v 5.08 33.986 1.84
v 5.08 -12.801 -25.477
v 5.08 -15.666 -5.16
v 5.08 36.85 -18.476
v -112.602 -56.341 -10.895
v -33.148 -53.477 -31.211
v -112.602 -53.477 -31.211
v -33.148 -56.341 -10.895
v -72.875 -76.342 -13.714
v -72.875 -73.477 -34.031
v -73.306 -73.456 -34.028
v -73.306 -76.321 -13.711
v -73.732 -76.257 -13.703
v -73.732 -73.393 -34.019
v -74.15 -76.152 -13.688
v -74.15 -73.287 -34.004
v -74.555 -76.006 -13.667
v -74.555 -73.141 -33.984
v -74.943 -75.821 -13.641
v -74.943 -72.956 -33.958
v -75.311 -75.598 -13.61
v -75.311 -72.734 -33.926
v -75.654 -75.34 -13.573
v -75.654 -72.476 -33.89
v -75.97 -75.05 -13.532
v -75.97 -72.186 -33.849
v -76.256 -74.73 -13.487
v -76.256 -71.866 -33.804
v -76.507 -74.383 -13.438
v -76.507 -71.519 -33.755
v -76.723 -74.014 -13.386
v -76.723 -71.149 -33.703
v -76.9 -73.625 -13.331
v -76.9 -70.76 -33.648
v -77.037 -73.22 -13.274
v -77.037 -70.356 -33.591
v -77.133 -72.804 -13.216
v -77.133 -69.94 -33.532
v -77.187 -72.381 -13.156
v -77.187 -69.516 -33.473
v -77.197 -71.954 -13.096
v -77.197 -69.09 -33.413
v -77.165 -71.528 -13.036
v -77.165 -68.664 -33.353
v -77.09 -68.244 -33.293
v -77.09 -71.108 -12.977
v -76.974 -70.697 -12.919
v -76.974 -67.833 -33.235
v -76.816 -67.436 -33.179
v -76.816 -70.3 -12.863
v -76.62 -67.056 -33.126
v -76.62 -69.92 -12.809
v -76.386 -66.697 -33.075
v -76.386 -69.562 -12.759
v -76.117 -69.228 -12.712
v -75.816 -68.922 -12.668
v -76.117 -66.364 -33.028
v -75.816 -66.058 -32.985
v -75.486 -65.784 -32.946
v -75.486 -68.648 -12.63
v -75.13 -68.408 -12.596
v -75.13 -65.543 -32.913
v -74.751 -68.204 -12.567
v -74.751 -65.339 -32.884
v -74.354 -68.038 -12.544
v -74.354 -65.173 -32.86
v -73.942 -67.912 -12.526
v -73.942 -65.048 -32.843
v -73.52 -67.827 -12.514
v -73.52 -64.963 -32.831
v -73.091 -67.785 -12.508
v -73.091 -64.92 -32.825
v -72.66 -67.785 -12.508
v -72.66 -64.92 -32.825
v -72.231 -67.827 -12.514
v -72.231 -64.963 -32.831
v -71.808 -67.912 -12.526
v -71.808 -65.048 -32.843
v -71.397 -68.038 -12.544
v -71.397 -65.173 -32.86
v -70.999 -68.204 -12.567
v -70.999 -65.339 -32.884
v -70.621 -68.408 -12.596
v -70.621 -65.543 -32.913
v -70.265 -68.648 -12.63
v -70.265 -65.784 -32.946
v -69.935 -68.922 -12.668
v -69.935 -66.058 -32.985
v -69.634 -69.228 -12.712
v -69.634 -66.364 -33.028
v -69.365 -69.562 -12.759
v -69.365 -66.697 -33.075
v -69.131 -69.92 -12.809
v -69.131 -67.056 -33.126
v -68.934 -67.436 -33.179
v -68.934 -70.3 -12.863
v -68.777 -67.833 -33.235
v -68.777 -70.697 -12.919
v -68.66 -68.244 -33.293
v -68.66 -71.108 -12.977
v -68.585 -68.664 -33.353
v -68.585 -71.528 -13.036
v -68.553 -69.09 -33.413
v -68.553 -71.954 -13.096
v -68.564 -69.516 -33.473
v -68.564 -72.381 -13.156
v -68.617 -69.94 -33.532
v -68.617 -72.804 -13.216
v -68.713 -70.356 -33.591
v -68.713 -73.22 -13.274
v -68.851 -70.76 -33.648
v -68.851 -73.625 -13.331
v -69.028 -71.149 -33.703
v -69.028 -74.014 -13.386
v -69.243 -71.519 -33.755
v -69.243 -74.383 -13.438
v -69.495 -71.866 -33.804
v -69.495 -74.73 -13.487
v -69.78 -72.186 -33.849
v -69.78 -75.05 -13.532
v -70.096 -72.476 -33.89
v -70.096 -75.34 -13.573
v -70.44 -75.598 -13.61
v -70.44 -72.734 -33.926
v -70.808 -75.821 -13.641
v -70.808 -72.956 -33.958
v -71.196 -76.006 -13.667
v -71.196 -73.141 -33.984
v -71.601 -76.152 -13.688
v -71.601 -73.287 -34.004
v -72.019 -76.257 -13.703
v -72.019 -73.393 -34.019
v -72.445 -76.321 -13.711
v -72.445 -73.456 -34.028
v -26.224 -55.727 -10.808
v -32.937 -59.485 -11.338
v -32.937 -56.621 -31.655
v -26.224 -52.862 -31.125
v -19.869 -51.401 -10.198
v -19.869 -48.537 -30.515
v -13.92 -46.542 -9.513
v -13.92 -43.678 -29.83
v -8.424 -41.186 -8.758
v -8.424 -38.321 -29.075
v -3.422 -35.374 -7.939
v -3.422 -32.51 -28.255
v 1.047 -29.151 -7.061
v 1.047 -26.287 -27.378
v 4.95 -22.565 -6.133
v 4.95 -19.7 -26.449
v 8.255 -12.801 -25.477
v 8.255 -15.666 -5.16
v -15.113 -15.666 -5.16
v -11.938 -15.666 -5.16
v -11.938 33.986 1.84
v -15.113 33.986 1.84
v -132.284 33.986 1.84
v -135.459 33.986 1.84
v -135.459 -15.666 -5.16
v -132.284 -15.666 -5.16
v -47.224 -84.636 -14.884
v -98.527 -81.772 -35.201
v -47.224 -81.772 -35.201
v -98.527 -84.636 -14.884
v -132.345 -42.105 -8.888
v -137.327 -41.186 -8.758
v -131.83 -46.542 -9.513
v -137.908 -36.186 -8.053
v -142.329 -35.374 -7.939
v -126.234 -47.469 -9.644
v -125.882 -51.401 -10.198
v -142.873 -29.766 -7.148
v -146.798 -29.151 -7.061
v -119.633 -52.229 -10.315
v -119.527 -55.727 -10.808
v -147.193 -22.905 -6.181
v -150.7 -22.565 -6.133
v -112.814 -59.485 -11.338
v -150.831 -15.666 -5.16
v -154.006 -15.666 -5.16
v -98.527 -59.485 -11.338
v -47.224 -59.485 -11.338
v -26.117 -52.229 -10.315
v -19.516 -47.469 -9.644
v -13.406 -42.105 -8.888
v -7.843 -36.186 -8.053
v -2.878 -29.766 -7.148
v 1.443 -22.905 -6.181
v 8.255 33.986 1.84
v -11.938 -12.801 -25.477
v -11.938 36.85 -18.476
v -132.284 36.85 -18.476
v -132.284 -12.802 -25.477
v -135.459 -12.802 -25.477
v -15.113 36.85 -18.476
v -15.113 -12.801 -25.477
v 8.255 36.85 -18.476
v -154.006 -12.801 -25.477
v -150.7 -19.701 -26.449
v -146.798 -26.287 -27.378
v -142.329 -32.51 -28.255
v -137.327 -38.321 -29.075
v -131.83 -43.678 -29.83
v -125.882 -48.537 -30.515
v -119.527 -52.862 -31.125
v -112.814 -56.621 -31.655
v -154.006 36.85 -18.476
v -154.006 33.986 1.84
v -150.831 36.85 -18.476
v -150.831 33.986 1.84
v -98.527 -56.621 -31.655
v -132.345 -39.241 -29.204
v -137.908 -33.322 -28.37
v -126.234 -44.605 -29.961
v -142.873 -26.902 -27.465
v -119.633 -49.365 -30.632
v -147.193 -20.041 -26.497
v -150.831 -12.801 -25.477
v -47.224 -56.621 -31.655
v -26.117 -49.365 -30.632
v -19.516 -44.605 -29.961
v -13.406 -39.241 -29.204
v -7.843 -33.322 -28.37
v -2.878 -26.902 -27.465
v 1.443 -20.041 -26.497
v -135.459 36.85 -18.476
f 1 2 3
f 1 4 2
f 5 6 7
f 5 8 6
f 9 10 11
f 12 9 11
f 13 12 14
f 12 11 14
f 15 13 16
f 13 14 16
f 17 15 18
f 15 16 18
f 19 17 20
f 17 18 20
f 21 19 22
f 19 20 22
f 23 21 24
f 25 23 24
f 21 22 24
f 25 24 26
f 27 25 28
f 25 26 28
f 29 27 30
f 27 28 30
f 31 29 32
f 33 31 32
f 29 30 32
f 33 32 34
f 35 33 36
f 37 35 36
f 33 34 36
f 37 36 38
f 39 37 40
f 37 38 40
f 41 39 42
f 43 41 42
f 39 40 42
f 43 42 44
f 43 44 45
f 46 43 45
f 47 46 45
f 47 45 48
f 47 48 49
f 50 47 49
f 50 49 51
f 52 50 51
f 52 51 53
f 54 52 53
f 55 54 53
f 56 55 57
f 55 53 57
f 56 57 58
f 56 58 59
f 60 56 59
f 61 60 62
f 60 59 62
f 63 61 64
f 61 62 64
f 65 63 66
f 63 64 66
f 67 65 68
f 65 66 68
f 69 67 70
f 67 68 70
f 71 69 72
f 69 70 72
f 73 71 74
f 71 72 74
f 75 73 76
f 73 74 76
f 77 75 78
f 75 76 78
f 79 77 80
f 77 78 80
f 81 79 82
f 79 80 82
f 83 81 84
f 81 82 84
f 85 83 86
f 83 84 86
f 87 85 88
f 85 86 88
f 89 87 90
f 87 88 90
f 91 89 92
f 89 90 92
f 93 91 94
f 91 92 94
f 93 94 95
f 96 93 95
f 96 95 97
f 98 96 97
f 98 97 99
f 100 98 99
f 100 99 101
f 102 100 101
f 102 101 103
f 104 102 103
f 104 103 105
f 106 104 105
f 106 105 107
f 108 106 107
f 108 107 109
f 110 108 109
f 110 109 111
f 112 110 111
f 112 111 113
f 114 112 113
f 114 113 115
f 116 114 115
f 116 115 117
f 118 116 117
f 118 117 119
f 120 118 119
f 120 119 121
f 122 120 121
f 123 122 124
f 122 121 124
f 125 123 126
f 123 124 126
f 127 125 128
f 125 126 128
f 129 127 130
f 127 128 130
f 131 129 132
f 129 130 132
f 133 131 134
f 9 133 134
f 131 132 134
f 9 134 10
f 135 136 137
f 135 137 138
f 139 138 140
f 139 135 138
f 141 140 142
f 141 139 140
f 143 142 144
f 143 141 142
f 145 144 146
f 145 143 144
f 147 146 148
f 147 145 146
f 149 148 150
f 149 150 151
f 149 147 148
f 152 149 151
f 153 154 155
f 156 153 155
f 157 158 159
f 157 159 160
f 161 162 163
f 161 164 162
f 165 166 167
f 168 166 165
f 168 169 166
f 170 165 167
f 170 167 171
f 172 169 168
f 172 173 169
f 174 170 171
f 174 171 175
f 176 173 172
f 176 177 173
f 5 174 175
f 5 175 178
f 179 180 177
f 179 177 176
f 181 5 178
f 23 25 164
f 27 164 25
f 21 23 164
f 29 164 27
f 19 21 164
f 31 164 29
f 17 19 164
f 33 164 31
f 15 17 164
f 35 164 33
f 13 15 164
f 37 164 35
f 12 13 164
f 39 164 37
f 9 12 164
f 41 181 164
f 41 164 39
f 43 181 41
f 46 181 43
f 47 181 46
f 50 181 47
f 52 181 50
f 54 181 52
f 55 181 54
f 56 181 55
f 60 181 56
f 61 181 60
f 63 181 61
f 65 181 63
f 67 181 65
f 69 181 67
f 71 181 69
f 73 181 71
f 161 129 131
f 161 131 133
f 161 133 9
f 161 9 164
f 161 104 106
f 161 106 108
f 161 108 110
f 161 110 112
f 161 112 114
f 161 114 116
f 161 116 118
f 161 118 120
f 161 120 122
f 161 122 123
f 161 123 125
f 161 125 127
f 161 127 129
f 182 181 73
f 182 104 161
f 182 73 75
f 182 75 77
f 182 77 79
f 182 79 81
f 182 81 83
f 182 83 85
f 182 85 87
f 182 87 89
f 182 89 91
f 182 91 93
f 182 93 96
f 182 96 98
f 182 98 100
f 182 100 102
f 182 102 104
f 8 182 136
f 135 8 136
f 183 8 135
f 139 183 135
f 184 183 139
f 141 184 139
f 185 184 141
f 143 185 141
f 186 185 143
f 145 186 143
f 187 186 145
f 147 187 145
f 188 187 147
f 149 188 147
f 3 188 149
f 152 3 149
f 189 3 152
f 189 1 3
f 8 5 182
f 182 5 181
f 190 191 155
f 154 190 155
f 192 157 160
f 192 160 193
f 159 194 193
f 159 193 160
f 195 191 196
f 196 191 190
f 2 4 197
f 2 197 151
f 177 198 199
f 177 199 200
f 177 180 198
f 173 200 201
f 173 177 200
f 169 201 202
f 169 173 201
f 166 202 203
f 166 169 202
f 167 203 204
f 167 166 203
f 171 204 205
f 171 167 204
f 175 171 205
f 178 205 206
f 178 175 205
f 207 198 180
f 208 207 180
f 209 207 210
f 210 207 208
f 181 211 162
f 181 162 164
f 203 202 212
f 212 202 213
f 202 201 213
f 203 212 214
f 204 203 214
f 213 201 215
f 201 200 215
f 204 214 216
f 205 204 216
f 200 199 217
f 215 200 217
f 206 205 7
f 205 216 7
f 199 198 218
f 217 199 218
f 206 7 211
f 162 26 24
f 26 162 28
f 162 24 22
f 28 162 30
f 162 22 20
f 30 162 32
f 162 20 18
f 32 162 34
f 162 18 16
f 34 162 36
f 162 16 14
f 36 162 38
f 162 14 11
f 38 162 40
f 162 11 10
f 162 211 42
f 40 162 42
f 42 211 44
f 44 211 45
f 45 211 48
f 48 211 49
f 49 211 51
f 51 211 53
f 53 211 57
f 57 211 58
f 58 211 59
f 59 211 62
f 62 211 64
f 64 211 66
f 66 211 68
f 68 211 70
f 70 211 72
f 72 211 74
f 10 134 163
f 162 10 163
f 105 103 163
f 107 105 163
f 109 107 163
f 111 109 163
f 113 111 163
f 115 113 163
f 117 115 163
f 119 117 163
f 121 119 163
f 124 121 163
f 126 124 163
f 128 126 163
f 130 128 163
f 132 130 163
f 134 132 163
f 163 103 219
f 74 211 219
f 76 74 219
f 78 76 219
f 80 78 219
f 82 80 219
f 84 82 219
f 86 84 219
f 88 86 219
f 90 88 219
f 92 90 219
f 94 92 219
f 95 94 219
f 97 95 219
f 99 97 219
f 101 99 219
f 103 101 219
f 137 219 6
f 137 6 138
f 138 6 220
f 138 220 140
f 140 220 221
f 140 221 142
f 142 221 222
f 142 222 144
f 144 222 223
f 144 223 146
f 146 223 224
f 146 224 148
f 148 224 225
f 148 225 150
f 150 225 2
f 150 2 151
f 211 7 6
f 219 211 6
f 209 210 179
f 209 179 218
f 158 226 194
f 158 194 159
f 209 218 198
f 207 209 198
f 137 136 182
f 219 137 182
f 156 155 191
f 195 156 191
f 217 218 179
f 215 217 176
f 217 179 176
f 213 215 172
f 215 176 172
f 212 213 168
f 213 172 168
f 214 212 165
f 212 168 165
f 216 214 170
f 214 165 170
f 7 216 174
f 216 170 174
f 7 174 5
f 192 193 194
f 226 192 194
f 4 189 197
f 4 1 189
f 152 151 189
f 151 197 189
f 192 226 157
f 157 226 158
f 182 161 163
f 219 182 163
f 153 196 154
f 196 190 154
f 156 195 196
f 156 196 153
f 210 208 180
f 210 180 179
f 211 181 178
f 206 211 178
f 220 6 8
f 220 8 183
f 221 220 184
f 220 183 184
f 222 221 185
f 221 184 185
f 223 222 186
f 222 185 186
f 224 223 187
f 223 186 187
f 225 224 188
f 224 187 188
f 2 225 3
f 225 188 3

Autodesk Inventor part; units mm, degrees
ref_plane "YZ Plane" through (0, 0, 0) normal (1, 0, 0) x (0, 1, 0)
ref_plane "XZ Plane" through (0, 0, 0) normal (0, 1, 0) x (-1, 0, 0)
ref_plane "XY Plane" through (0, 0, 0) normal (0, 0, 1) x (1, 0, 0)
sketch "Sketch1" plane through (0, 0, 0) normal (1, 0, 0) x (0, 1, 0)
  spline S0 degree 3 poles (-12.7596, 69.1102) (-15.2298, 61.5354) (-16.003, 54.7493) (-14.7341, 46.512) (-13.9585, 44.5403) (-12.6997, 40.1512) (-11.8689, 37.886) (-10.5675, 32.6221) (-10.0341, 29.5076) (-9.2498, 23.4956) (-9.1586, 20.4828) (-8.7362, 14.9457) (-8.298, 12.4468) (-8.4378, 7.0305) (-9.5013, 4.1287) (-9.4732, -0.7666) (-9.0812, -2.8089) (-8.7088, -6.0813) (-8.5625, -7.3217) (-8.4075, -8.5547) knots 0 0 0 0 0.241973 0.241973 0.332352 0.332352 0.424089 0.424089 0.541798 0.541798 0.658072 0.658072 0.76087 0.76087 0.872069 0.872069 0.951758 0.951758 1 1 1 1 construction
  spline S1 degree 3 poles (-8.4075, -8.5547) (-8.309, -9.3389) (-8.207, -10.12) (-7.7153, -13.7099) (-7.2118, -16.3393) (-6.3841, -22.1405) (-6.6665, -24.8142) (-5.6218, -28.3135) knots 0 0 0 0 0.119502 0.119502 0.553846 0.553846 1 1 1 1 construction
  spline S2 degree 3 poles (-5.6218, -28.3135) (-4.1228, -33.3346) (0.624, -41.8906) (3.9625, -48.268) (4.5736, -49.3774) (8.1498, -55.2575) (12.792, -61.9002) (17.7565, -68.8098) (19.0389, -70.9296) (26.2047, -78.6536) (35.4784, -85.2147) (49.0059, -92.3069) (55.6073, -92.3063) (68.5377, -94.6562) (74.996, -95.2419) (83.2666, -94.7145) (86.6124, -93.0362) (89.415, -93.015) (89.4684, -93.7995) (89.9841, -94.339) (90.2258, -94.7218) (89.67, -94.6644) (89.4356, -94.0936) (87.2104, -94.21) (84.8902, -94.7513) (80.0382, -96.05) (76.8909, -97.5474) (70.3825, -98.6246) (66.2945, -98.5443) (60.1257, -98.0168) (58.2481, -97.7121) (54.5132, -96.7744) (53.8418, -96.5978) (53.124, -96.4018) knots 0 0 0 0 0.060463 0.060463 0.088876 0.088876 0.149034 0.149034 0.189187 0.189187 0.280144 0.280144 0.381032 0.381032 0.501928 0.501928 0.587779 0.587779 0.653298 0.653298 0.710459 0.710459 0.757232 0.757232 0.814775 0.814775 0.872532 0.872532 0.939307 0.939307 0.990036 0.990036 1 1 1 1 construction
  spline S3 degree 3 poles (29.4725, -27.9505) (29.7232, -28.7604) (30.1347, -29.057) (32.5515, -32.3248) (34.3621, -34.4691) (37.878, -38.892) (37.7974, -39.3941) (41.586, -43.4308) (43.873, -45.7682) (49.5626, -50.6314) (51.8392, -50.9545) (60.2395, -53.9595) (66.6243, -55.2783) (76.7213, -57.0347) (82.4961, -56.8836) (87.4768, -57.2216) (87.6182, -57.0776) (89.8132, -57.4611) (91.5195, -57.7058) (92.188, -58.3474) (92.2546, -58.677) (90.5785, -59.545) (88.9174, -60.1439) (85.9397, -61.0379) (84.1283, -61.4382) (81.4338, -61.8751) (80.6089, -61.9837) (79.7567, -62.0753) knots 0 0 0 0 0.04737 0.04737 0.082065 0.082065 0.155524 0.155524 0.204555 0.204555 0.315622 0.315622 0.438816 0.438816 0.586443 0.586443 0.691275 0.691275 0.771281 0.771281 0.841079 0.841079 0.898194 0.898194 0.96846 0.96846 1 1 1 1 construction
  spline S4 degree 3 poles (28.8564, -23.7777) (28.9042, -24.5022) (28.9667, -25.1696) (29.2425, -26.8854) (29.3324, -27.498) (29.4725, -27.9505) knots 0 0 0 0 0.335914 0.335914 1 1 1 1 construction
  spline S5 degree 3 poles (27.5568, -11.1594) (27.8944, -13.1016) (28.2256, -15.1008) (28.7027, -19.1945) (28.7203, -21.7171) (28.8564, -23.7777) knots 0 0 0 0 0.46171 0.46171 1 1 1 1 construction
  spline S6 degree 3 poles (26.2925, -4.4074) (26.5211, -5.6352) (26.805, -6.8301) (27.1945, -9.1012) (27.3765, -10.1222) (27.5568, -11.1594) knots 0 0 0 0 0.568778 0.568778 1 1 1 1 construction
  spline S7 degree 3 poles (16.0432, 69.6268) (18.6865, 66.183) (20.6385, 61.0286) (22.3448, 51.7367) (22.7474, 48.7933) (23.2098, 43.6518) (23.1117, 41.1975) (23.483, 35.6031) (24.0275, 32.6396) (24.3977, 26.501) (24.1107, 23.3997) (24.6444, 17.6215) (25.4306, 14.8381) (25.926, 9.3729) (25.7134, 6.8435) (25.8358, 1.9262) (25.7789, -0.3383) (26.0611, -3.0685) (26.1687, -3.7428) (26.2925, -4.4074) knots 0 0 0 0 0.257427 0.257427 0.348427 0.348427 0.440796 0.440796 0.559313 0.559313 0.676387 0.676387 0.779892 0.779892 0.891856 0.891856 0.972092 0.972092 1 1 1 1 construction
  point P0 (0, 0)
ref_plane "Work Plane1" through (0, -5.6218, -28.3135) normal (-1, 0, 0) x (0, -0.1396054, 0.9902072)
ref_plane "Work Plane2" through (5.08, -5.6218, -28.3135) normal (-1, 0, 0) x (0, -0.1396054, 0.9902072)
sketch "Sketch2" plane through (5.08, -5.6218, -28.3135) normal (-1, 0, 0) x (0, -0.1396054, 0.9902072)
  line L0 (3.8114, -6.7133) -> (24.329, -6.7133)
  line L1 (24.329, -6.7133) -> (24.329, 43.4294)
  line L2 (24.329, 43.4294) -> (3.8114, 43.4294)
  line L3 (3.8114, 43.4294) -> (3.8114, -6.7133)
  point P0 (27.2514, 9.5195)
extrude "Extrusion1" add sketch "Sketch2" against normal blind 3.175
ref_plane "Work Plane3" through (-11.938, -5.6218, -28.3135) normal (-1, 0, 0) x (0, -0.1396054, 0.9902072)
sketch "Sketch3" plane through (-11.938, -5.6218, -28.3135) normal (-1, 0, 0) x (0, -0.1396054, 0.9902072)
  line L0 (24.329, -6.7133) -> (24.329, 43.4294) projected
  line L1 (24.329, 43.4294) -> (3.8114, 43.4294) projected
  line L2 (3.8114, 43.4294) -> (3.8114, -6.7133) projected
  line L3 (3.8114, -6.7133) -> (24.329, -6.7133) projected
  point P0 (27.2514, 9.5195)
extrude "Extrusion2" add sketch "Sketch3" along normal blind 3.175
sketch "Sketch4" plane through (5.08, -5.6218, -28.3135) normal (-1, 0, 0) x (0, -0.1396054, 0.9902072)
  point P0 (27.2514, 9.5195)
ref_plane "Work Plane4" through (6.6675, 33.9858, 1.8402) normal (0, 0.9902072, 0.1396054) x (0, 0.1396054, -0.9902072)
ref_plane "Work Plane5" through (8.255, -12.8015, -25.4766) normal (0, -0.9902072, -0.1396054) x (0, -0.1396054, 0.9902072)
sketch "Sketch5" plane through (8.255, -12.8015, -25.4766) normal (0, -0.9902072, -0.1396054) x (0, -0.1396054, 0.9902072)
  line L0 (0, 20.193) -> (0, 23.368) construction
  line L1 (20.5176, 20.193) -> (20.5176, 23.368) construction
  line L2 (0, 23.368) -> (0, 209.8691) construction
  line L3 (0, 143.7138) -> (20.5176, 143.7138)
  line L4 (20.5176, 143.7138) -> (20.5176, 140.5388)
  line L5 (20.5176, 140.5388) -> (0, 140.5388)
  line L6 (0, 140.5388) -> (0, 143.7138)
  line L7 (0, 162.2606) -> (20.5176, 162.2606)
  line L8 (20.5176, 162.2606) -> (20.5176, 159.0856)
  line L9 (20.5176, 159.0856) -> (0, 159.0856)
  line L10 (0, 159.0856) -> (0, 162.2606)
  point P0 (23.44, 8.255)
  dimension "d6" = 3.175
  dimension "d7" = 3.175
extrude "Extrusion3" add sketch "Sketch5" against normal up to surface (50.1427 mm away)
sketch "Sketch7" plane through (8.255, -12.8015, -25.4766) normal (0, -0.9902072, -0.1396054) x (0, -0.1396054, 0.9902072)
  line L0 (0, 3.175) -> (20.5176, 3.175) projected
  line L1 (0, 3.175) -> (0, 0) projected
  line L2 (20.5176, 0) -> (0, 0) projected
  line L3 (20.5176, 3.175) -> (20.5176, 0) projected
  line L4 (0, 159.0856) -> (20.5176, 159.0856) projected
  line L5 (20.5176, 159.0856) -> (20.5176, 162.2606) projected
  line L6 (20.5176, 162.2606) -> (0, 162.2606) projected
  line L7 (0, 162.2606) -> (0, 159.0856) projected
  point P0 (23.44, 8.255)
sketch "Sketch8" plane through (-154.0056, -15.6658, -5.16) normal (0, -0.1396054, 0.9902072) x (1, 0, 0)
  line L0 (159.0856, 0) -> (159.0856, 50.1427) projected
  line L1 (159.0856, 0) -> (162.2606, 0) projected
  line L2 (162.2606, 50.1427) -> (162.2606, 0) projected
  line L3 (159.0856, 50.1427) -> (162.2606, 50.1427) projected
  line L4 (3.175, 50.1427) -> (0, 50.1427) projected
  line L5 (0, 0) -> (0, 50.1427) projected
  line L6 (3.175, 0) -> (0, 0) projected
  line L7 (3.175, 0) -> (3.175, 50.1427) projected
  line L8 (120.8571, -41.0775) -> (41.4035, -41.0775)
  arc A0 (3.175, 0) -> (41.4035, -41.0775) centre (81.1303, 34.2212) ccw
  arc A1 (120.8571, -41.0775) -> (159.0856, 0) centre (81.1303, 34.2212) ccw
  arc A2 (121.0688, -44.2525) -> (162.2606, 0) centre (81.1303, 34.2212) ccw
  line L9 (121.0688, -44.2525) -> (41.1917, -44.2525)
  arc A3 (0, 0) -> (41.1917, -44.2525) centre (81.1303, 34.2212) ccw
  line L10 (0, 0) -> (0, 50.1427) projected
  line L11 (162.2606, 50.1427) -> (162.2606, 0) projected
  line L12 (200.1965, 0) -> (-37.9359, 0) projected
  point P0 (154.0056, 16.2328)
  dimension "d10" = 41.0775
  dimension "d12" = 3.175
extrude "Extrusion4" add sketch "Sketch8" against normal up to surface (20.5176 mm away) contours L1 A2 L9 A3 L6 A0 L8 A1
sketch "Sketch9" plane through (-112.8138, -59.485, -11.3379) normal (0, -0.9902072, -0.1396054) x (1, 0, 0)
  line L0 (0, -20.5176) -> (79.8771, -20.5176) projected
  line L1 (79.8771, 0) -> (79.8771, -20.5176) projected
  line L2 (0, 0) -> (79.8771, 0) projected
  line L3 (0, 0) -> (0, -20.5176) projected
  line L4 (14.2872, 0) -> (65.5899, 0)
  line L5 (65.5899, 0) -> (65.5899, -20.5176)
  line L6 (65.5899, -20.5176) -> (14.2872, -20.5176)
  line L7 (14.2872, -20.5176) -> (14.2872, 0)
  point P0 (112.8138, 2.9224)
  point P1 (14.2872, -10.2588)
  point P2 (0, -10.2588)
  point P3 (79.8771, -10.2588)
  point P4 (65.5899, -10.2588)
  dimension "d15" = 14.2872
  dimension "d16" = 14.2872
extrude "Extrusion5" add sketch "Sketch9" along normal blind 25.4 contours L7 L2 L5 L0
sketch "Sketch10" plane through (-112.6021, -56.3411, -10.8946) normal (0, -0.1396054, 0.9902072) x (1, 0, 0)
  line L0 (65.3781, -28.575) -> (14.0755, -28.575) projected
  line L1 (-0.2118, -3.175) -> (14.0755, -3.175) projected
  line L2 (65.3781, -28.575) -> (14.0755, -28.575)
  line L3 (14.0755, -28.575) -> (14.0755, -3.175)
  line L4 (14.0755, -3.175) -> (65.3781, -3.175)
  line L5 (65.3781, -3.175) -> (65.3781, -28.575)
  circle A0 centre (39.7268, -15.875) radius 5
  point P0 (112.6021, 57.3103)
  dimension "d19" = 10
hole "Hole1" at (-72.8753, -72.0607, -13.1109) direction (0, 0.1396054, -0.9902072) diameter 8.647 end through all thread size "M10x1.25" class "6H" standard "ANSI Metric M Profile"
sketch "Sketch11" plane through (-112.6021, -56.3411, -10.8946) normal (0, -0.1396054, 0.9902072) x (1, 0, 0)
  point P0 (112.6021, 57.3103)
equation "\"d16\" = d15"
properties part number "imu_mount"
